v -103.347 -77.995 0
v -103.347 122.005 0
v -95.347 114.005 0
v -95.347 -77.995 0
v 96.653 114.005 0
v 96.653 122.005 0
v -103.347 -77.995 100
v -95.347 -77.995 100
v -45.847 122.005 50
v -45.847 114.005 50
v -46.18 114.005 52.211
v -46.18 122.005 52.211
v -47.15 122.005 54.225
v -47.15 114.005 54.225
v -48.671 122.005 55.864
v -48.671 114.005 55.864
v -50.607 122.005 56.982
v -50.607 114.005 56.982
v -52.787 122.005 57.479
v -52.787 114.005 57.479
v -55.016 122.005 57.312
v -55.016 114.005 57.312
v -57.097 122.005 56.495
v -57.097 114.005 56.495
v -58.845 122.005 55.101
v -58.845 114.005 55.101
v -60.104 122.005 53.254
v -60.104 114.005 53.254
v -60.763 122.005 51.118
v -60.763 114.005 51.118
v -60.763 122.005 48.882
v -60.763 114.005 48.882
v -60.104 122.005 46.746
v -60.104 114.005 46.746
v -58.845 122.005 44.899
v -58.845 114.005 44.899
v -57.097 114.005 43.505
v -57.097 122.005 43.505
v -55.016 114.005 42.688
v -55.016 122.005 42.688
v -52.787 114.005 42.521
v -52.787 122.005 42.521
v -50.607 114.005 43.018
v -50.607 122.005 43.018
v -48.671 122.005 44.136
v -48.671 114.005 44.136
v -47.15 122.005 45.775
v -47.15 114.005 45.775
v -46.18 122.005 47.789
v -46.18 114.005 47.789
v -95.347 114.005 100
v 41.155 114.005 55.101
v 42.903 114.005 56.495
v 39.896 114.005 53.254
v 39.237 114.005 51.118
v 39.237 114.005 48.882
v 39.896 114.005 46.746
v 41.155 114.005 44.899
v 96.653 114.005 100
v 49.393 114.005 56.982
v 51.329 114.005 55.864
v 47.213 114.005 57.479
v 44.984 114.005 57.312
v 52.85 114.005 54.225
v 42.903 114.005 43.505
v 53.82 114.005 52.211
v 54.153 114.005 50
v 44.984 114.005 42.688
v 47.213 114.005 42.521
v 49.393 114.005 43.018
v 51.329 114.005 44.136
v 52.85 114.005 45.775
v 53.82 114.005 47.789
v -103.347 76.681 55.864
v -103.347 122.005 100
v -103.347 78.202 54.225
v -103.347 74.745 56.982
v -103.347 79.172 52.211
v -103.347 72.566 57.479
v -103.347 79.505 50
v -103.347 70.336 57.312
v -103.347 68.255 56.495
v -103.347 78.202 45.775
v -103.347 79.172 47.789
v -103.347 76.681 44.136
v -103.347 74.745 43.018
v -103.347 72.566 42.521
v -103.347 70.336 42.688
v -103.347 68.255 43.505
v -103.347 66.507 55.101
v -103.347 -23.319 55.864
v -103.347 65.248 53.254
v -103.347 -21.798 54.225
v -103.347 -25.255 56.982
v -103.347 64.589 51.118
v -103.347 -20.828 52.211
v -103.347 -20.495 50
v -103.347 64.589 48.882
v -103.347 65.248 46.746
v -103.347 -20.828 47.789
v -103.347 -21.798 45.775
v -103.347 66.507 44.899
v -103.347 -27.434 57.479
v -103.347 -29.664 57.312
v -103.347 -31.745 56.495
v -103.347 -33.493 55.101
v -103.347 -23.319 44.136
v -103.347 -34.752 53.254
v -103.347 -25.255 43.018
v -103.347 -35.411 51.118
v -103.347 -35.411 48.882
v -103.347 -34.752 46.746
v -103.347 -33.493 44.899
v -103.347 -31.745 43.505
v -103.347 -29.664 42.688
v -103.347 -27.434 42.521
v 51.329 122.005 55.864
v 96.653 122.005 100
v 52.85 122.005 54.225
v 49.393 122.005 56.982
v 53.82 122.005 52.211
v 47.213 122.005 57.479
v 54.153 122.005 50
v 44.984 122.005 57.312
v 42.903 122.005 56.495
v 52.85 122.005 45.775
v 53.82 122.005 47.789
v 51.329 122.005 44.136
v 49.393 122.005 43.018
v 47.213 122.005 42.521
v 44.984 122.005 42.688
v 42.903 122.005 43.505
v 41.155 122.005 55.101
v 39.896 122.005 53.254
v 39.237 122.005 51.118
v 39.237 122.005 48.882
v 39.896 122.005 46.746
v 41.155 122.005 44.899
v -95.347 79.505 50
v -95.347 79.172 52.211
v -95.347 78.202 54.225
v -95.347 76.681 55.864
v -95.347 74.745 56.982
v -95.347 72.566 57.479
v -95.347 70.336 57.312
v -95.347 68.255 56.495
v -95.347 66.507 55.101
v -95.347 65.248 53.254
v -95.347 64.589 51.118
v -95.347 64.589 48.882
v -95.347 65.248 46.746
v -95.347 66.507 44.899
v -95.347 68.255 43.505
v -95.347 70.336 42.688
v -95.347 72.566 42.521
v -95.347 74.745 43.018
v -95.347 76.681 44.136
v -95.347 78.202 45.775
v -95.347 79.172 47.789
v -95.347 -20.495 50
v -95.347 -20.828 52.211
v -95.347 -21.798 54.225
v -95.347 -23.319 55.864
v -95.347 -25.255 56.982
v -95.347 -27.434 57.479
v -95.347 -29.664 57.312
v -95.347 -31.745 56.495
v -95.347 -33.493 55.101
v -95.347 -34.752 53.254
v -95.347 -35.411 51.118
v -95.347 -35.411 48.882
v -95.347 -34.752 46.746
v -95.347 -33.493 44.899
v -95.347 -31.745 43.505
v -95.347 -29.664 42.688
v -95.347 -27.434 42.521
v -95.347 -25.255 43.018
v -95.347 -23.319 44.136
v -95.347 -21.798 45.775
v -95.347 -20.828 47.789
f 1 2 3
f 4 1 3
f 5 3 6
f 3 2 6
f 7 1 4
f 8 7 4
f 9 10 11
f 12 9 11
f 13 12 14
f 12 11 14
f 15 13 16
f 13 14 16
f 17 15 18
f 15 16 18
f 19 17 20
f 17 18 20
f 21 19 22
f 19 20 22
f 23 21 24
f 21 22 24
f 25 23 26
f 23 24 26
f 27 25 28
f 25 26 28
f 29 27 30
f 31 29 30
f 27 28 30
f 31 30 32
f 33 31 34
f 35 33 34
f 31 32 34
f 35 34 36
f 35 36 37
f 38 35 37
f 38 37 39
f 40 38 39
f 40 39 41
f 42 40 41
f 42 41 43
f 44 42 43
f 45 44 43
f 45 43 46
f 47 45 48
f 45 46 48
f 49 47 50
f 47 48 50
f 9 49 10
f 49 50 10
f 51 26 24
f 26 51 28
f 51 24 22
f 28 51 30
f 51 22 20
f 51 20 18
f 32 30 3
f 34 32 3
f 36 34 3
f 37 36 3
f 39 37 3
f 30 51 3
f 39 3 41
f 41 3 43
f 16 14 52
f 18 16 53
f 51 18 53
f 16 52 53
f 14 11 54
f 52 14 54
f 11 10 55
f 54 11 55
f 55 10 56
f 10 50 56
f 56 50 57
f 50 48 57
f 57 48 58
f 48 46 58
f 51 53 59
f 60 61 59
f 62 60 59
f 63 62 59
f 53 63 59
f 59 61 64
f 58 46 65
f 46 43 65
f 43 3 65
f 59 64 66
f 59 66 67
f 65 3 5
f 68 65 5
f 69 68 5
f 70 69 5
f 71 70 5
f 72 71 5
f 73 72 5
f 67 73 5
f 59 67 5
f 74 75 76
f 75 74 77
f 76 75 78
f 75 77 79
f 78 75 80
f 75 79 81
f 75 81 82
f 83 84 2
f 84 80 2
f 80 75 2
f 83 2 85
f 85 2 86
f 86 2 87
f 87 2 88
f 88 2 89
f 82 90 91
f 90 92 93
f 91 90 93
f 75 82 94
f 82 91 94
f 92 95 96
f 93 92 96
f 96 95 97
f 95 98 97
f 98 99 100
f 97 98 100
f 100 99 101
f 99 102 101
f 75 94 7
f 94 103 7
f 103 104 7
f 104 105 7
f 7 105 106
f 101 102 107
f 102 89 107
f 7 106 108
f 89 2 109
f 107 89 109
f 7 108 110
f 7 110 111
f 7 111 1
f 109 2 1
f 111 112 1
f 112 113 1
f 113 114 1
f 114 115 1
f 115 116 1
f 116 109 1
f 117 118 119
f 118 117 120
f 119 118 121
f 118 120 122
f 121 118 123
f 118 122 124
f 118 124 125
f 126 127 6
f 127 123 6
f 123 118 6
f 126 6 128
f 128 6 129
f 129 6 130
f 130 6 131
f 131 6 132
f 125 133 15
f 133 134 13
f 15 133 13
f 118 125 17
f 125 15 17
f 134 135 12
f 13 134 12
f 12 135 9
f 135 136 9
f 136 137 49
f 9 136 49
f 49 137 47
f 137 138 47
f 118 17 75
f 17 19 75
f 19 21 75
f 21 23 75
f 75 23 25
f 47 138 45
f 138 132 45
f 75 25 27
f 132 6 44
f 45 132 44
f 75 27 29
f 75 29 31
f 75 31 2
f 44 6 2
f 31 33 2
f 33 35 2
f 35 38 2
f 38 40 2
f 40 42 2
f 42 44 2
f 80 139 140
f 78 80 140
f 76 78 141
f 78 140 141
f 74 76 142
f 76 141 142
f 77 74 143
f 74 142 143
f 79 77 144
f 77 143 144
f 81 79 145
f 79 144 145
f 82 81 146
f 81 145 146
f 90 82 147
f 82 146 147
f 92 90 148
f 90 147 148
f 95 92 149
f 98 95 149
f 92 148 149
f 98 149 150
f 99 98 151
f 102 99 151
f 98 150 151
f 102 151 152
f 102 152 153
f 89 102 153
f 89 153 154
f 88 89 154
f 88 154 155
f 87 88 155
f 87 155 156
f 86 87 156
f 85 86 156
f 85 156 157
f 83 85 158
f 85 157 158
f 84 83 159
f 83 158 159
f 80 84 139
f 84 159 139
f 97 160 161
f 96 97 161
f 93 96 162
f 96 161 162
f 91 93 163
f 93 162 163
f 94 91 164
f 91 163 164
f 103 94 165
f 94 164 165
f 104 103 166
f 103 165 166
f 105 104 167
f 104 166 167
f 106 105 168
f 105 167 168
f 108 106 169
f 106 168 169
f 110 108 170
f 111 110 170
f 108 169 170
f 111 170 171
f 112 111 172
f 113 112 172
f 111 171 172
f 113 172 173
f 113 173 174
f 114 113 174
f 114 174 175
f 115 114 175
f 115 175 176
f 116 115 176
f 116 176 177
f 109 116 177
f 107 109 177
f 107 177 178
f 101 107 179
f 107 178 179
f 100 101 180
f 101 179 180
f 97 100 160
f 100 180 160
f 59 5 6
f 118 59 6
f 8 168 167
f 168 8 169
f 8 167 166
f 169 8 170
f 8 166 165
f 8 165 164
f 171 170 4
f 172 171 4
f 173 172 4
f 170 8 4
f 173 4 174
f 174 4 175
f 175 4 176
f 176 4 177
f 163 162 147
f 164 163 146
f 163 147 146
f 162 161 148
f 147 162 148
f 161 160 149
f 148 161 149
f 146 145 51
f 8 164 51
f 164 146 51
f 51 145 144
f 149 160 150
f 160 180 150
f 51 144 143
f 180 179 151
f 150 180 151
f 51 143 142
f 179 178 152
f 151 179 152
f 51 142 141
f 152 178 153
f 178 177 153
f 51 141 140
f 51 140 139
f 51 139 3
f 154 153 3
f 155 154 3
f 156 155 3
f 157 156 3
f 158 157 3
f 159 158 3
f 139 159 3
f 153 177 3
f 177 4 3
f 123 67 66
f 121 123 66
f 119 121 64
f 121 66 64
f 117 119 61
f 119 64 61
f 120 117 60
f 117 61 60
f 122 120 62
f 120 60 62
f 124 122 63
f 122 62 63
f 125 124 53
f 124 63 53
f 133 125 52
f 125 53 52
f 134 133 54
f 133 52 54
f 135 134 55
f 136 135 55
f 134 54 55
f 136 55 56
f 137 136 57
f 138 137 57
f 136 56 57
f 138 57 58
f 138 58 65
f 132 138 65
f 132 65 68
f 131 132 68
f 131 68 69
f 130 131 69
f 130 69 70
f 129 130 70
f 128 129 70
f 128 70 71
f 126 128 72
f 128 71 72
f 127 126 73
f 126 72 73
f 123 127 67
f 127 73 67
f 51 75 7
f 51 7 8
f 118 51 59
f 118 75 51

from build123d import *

# Parameters (mm, degrees)
F0_W     = 192
F0_H     = 8
F0_W_2   = 8
F0_H_2   = 192
F1_DEPTH = 100
F2_R     = 7.5
F3_DEPTH = 8
F4_R     = 7.5
F5_DEPTH = 8


with BuildPart() as f1:
    # F0 (on Top) → F1 (new body)
    with BuildSketch(Plane.XY):
        with Locations((0.652894, 118.005262)):
            Rectangle(F0_W, F0_H)
        with Locations((-99.347106, 118.005262)):
            Rectangle(F0_W_2, F0_H)
        with Locations((-99.347106, 18.005262)):
            Rectangle(F0_W_2, F0_H_2)
    extrude(amount=F1_DEPTH)

    # F2 (on face) → F3 (cut)
    with BuildSketch(Plane.XZ.offset(-114.005262)):
        with Locations((-53.347106, 50)):
            Circle(F2_R)
        with Locations((46.652894, 50)):
            Circle(F2_R)
    extrude(amount=-F3_DEPTH, mode=Mode.SUBTRACT)

    # F4 (on face) → F5 (cut)
    with BuildSketch(Plane.YZ.offset(-95.347106)):
        with Locations((-27.994738, 50)):
            Circle(F4_R)
        with Locations((72.005262, 50)):
            Circle(F4_R)
    extrude(amount=-F5_DEPTH, mode=Mode.SUBTRACT)


solid = f1.part
